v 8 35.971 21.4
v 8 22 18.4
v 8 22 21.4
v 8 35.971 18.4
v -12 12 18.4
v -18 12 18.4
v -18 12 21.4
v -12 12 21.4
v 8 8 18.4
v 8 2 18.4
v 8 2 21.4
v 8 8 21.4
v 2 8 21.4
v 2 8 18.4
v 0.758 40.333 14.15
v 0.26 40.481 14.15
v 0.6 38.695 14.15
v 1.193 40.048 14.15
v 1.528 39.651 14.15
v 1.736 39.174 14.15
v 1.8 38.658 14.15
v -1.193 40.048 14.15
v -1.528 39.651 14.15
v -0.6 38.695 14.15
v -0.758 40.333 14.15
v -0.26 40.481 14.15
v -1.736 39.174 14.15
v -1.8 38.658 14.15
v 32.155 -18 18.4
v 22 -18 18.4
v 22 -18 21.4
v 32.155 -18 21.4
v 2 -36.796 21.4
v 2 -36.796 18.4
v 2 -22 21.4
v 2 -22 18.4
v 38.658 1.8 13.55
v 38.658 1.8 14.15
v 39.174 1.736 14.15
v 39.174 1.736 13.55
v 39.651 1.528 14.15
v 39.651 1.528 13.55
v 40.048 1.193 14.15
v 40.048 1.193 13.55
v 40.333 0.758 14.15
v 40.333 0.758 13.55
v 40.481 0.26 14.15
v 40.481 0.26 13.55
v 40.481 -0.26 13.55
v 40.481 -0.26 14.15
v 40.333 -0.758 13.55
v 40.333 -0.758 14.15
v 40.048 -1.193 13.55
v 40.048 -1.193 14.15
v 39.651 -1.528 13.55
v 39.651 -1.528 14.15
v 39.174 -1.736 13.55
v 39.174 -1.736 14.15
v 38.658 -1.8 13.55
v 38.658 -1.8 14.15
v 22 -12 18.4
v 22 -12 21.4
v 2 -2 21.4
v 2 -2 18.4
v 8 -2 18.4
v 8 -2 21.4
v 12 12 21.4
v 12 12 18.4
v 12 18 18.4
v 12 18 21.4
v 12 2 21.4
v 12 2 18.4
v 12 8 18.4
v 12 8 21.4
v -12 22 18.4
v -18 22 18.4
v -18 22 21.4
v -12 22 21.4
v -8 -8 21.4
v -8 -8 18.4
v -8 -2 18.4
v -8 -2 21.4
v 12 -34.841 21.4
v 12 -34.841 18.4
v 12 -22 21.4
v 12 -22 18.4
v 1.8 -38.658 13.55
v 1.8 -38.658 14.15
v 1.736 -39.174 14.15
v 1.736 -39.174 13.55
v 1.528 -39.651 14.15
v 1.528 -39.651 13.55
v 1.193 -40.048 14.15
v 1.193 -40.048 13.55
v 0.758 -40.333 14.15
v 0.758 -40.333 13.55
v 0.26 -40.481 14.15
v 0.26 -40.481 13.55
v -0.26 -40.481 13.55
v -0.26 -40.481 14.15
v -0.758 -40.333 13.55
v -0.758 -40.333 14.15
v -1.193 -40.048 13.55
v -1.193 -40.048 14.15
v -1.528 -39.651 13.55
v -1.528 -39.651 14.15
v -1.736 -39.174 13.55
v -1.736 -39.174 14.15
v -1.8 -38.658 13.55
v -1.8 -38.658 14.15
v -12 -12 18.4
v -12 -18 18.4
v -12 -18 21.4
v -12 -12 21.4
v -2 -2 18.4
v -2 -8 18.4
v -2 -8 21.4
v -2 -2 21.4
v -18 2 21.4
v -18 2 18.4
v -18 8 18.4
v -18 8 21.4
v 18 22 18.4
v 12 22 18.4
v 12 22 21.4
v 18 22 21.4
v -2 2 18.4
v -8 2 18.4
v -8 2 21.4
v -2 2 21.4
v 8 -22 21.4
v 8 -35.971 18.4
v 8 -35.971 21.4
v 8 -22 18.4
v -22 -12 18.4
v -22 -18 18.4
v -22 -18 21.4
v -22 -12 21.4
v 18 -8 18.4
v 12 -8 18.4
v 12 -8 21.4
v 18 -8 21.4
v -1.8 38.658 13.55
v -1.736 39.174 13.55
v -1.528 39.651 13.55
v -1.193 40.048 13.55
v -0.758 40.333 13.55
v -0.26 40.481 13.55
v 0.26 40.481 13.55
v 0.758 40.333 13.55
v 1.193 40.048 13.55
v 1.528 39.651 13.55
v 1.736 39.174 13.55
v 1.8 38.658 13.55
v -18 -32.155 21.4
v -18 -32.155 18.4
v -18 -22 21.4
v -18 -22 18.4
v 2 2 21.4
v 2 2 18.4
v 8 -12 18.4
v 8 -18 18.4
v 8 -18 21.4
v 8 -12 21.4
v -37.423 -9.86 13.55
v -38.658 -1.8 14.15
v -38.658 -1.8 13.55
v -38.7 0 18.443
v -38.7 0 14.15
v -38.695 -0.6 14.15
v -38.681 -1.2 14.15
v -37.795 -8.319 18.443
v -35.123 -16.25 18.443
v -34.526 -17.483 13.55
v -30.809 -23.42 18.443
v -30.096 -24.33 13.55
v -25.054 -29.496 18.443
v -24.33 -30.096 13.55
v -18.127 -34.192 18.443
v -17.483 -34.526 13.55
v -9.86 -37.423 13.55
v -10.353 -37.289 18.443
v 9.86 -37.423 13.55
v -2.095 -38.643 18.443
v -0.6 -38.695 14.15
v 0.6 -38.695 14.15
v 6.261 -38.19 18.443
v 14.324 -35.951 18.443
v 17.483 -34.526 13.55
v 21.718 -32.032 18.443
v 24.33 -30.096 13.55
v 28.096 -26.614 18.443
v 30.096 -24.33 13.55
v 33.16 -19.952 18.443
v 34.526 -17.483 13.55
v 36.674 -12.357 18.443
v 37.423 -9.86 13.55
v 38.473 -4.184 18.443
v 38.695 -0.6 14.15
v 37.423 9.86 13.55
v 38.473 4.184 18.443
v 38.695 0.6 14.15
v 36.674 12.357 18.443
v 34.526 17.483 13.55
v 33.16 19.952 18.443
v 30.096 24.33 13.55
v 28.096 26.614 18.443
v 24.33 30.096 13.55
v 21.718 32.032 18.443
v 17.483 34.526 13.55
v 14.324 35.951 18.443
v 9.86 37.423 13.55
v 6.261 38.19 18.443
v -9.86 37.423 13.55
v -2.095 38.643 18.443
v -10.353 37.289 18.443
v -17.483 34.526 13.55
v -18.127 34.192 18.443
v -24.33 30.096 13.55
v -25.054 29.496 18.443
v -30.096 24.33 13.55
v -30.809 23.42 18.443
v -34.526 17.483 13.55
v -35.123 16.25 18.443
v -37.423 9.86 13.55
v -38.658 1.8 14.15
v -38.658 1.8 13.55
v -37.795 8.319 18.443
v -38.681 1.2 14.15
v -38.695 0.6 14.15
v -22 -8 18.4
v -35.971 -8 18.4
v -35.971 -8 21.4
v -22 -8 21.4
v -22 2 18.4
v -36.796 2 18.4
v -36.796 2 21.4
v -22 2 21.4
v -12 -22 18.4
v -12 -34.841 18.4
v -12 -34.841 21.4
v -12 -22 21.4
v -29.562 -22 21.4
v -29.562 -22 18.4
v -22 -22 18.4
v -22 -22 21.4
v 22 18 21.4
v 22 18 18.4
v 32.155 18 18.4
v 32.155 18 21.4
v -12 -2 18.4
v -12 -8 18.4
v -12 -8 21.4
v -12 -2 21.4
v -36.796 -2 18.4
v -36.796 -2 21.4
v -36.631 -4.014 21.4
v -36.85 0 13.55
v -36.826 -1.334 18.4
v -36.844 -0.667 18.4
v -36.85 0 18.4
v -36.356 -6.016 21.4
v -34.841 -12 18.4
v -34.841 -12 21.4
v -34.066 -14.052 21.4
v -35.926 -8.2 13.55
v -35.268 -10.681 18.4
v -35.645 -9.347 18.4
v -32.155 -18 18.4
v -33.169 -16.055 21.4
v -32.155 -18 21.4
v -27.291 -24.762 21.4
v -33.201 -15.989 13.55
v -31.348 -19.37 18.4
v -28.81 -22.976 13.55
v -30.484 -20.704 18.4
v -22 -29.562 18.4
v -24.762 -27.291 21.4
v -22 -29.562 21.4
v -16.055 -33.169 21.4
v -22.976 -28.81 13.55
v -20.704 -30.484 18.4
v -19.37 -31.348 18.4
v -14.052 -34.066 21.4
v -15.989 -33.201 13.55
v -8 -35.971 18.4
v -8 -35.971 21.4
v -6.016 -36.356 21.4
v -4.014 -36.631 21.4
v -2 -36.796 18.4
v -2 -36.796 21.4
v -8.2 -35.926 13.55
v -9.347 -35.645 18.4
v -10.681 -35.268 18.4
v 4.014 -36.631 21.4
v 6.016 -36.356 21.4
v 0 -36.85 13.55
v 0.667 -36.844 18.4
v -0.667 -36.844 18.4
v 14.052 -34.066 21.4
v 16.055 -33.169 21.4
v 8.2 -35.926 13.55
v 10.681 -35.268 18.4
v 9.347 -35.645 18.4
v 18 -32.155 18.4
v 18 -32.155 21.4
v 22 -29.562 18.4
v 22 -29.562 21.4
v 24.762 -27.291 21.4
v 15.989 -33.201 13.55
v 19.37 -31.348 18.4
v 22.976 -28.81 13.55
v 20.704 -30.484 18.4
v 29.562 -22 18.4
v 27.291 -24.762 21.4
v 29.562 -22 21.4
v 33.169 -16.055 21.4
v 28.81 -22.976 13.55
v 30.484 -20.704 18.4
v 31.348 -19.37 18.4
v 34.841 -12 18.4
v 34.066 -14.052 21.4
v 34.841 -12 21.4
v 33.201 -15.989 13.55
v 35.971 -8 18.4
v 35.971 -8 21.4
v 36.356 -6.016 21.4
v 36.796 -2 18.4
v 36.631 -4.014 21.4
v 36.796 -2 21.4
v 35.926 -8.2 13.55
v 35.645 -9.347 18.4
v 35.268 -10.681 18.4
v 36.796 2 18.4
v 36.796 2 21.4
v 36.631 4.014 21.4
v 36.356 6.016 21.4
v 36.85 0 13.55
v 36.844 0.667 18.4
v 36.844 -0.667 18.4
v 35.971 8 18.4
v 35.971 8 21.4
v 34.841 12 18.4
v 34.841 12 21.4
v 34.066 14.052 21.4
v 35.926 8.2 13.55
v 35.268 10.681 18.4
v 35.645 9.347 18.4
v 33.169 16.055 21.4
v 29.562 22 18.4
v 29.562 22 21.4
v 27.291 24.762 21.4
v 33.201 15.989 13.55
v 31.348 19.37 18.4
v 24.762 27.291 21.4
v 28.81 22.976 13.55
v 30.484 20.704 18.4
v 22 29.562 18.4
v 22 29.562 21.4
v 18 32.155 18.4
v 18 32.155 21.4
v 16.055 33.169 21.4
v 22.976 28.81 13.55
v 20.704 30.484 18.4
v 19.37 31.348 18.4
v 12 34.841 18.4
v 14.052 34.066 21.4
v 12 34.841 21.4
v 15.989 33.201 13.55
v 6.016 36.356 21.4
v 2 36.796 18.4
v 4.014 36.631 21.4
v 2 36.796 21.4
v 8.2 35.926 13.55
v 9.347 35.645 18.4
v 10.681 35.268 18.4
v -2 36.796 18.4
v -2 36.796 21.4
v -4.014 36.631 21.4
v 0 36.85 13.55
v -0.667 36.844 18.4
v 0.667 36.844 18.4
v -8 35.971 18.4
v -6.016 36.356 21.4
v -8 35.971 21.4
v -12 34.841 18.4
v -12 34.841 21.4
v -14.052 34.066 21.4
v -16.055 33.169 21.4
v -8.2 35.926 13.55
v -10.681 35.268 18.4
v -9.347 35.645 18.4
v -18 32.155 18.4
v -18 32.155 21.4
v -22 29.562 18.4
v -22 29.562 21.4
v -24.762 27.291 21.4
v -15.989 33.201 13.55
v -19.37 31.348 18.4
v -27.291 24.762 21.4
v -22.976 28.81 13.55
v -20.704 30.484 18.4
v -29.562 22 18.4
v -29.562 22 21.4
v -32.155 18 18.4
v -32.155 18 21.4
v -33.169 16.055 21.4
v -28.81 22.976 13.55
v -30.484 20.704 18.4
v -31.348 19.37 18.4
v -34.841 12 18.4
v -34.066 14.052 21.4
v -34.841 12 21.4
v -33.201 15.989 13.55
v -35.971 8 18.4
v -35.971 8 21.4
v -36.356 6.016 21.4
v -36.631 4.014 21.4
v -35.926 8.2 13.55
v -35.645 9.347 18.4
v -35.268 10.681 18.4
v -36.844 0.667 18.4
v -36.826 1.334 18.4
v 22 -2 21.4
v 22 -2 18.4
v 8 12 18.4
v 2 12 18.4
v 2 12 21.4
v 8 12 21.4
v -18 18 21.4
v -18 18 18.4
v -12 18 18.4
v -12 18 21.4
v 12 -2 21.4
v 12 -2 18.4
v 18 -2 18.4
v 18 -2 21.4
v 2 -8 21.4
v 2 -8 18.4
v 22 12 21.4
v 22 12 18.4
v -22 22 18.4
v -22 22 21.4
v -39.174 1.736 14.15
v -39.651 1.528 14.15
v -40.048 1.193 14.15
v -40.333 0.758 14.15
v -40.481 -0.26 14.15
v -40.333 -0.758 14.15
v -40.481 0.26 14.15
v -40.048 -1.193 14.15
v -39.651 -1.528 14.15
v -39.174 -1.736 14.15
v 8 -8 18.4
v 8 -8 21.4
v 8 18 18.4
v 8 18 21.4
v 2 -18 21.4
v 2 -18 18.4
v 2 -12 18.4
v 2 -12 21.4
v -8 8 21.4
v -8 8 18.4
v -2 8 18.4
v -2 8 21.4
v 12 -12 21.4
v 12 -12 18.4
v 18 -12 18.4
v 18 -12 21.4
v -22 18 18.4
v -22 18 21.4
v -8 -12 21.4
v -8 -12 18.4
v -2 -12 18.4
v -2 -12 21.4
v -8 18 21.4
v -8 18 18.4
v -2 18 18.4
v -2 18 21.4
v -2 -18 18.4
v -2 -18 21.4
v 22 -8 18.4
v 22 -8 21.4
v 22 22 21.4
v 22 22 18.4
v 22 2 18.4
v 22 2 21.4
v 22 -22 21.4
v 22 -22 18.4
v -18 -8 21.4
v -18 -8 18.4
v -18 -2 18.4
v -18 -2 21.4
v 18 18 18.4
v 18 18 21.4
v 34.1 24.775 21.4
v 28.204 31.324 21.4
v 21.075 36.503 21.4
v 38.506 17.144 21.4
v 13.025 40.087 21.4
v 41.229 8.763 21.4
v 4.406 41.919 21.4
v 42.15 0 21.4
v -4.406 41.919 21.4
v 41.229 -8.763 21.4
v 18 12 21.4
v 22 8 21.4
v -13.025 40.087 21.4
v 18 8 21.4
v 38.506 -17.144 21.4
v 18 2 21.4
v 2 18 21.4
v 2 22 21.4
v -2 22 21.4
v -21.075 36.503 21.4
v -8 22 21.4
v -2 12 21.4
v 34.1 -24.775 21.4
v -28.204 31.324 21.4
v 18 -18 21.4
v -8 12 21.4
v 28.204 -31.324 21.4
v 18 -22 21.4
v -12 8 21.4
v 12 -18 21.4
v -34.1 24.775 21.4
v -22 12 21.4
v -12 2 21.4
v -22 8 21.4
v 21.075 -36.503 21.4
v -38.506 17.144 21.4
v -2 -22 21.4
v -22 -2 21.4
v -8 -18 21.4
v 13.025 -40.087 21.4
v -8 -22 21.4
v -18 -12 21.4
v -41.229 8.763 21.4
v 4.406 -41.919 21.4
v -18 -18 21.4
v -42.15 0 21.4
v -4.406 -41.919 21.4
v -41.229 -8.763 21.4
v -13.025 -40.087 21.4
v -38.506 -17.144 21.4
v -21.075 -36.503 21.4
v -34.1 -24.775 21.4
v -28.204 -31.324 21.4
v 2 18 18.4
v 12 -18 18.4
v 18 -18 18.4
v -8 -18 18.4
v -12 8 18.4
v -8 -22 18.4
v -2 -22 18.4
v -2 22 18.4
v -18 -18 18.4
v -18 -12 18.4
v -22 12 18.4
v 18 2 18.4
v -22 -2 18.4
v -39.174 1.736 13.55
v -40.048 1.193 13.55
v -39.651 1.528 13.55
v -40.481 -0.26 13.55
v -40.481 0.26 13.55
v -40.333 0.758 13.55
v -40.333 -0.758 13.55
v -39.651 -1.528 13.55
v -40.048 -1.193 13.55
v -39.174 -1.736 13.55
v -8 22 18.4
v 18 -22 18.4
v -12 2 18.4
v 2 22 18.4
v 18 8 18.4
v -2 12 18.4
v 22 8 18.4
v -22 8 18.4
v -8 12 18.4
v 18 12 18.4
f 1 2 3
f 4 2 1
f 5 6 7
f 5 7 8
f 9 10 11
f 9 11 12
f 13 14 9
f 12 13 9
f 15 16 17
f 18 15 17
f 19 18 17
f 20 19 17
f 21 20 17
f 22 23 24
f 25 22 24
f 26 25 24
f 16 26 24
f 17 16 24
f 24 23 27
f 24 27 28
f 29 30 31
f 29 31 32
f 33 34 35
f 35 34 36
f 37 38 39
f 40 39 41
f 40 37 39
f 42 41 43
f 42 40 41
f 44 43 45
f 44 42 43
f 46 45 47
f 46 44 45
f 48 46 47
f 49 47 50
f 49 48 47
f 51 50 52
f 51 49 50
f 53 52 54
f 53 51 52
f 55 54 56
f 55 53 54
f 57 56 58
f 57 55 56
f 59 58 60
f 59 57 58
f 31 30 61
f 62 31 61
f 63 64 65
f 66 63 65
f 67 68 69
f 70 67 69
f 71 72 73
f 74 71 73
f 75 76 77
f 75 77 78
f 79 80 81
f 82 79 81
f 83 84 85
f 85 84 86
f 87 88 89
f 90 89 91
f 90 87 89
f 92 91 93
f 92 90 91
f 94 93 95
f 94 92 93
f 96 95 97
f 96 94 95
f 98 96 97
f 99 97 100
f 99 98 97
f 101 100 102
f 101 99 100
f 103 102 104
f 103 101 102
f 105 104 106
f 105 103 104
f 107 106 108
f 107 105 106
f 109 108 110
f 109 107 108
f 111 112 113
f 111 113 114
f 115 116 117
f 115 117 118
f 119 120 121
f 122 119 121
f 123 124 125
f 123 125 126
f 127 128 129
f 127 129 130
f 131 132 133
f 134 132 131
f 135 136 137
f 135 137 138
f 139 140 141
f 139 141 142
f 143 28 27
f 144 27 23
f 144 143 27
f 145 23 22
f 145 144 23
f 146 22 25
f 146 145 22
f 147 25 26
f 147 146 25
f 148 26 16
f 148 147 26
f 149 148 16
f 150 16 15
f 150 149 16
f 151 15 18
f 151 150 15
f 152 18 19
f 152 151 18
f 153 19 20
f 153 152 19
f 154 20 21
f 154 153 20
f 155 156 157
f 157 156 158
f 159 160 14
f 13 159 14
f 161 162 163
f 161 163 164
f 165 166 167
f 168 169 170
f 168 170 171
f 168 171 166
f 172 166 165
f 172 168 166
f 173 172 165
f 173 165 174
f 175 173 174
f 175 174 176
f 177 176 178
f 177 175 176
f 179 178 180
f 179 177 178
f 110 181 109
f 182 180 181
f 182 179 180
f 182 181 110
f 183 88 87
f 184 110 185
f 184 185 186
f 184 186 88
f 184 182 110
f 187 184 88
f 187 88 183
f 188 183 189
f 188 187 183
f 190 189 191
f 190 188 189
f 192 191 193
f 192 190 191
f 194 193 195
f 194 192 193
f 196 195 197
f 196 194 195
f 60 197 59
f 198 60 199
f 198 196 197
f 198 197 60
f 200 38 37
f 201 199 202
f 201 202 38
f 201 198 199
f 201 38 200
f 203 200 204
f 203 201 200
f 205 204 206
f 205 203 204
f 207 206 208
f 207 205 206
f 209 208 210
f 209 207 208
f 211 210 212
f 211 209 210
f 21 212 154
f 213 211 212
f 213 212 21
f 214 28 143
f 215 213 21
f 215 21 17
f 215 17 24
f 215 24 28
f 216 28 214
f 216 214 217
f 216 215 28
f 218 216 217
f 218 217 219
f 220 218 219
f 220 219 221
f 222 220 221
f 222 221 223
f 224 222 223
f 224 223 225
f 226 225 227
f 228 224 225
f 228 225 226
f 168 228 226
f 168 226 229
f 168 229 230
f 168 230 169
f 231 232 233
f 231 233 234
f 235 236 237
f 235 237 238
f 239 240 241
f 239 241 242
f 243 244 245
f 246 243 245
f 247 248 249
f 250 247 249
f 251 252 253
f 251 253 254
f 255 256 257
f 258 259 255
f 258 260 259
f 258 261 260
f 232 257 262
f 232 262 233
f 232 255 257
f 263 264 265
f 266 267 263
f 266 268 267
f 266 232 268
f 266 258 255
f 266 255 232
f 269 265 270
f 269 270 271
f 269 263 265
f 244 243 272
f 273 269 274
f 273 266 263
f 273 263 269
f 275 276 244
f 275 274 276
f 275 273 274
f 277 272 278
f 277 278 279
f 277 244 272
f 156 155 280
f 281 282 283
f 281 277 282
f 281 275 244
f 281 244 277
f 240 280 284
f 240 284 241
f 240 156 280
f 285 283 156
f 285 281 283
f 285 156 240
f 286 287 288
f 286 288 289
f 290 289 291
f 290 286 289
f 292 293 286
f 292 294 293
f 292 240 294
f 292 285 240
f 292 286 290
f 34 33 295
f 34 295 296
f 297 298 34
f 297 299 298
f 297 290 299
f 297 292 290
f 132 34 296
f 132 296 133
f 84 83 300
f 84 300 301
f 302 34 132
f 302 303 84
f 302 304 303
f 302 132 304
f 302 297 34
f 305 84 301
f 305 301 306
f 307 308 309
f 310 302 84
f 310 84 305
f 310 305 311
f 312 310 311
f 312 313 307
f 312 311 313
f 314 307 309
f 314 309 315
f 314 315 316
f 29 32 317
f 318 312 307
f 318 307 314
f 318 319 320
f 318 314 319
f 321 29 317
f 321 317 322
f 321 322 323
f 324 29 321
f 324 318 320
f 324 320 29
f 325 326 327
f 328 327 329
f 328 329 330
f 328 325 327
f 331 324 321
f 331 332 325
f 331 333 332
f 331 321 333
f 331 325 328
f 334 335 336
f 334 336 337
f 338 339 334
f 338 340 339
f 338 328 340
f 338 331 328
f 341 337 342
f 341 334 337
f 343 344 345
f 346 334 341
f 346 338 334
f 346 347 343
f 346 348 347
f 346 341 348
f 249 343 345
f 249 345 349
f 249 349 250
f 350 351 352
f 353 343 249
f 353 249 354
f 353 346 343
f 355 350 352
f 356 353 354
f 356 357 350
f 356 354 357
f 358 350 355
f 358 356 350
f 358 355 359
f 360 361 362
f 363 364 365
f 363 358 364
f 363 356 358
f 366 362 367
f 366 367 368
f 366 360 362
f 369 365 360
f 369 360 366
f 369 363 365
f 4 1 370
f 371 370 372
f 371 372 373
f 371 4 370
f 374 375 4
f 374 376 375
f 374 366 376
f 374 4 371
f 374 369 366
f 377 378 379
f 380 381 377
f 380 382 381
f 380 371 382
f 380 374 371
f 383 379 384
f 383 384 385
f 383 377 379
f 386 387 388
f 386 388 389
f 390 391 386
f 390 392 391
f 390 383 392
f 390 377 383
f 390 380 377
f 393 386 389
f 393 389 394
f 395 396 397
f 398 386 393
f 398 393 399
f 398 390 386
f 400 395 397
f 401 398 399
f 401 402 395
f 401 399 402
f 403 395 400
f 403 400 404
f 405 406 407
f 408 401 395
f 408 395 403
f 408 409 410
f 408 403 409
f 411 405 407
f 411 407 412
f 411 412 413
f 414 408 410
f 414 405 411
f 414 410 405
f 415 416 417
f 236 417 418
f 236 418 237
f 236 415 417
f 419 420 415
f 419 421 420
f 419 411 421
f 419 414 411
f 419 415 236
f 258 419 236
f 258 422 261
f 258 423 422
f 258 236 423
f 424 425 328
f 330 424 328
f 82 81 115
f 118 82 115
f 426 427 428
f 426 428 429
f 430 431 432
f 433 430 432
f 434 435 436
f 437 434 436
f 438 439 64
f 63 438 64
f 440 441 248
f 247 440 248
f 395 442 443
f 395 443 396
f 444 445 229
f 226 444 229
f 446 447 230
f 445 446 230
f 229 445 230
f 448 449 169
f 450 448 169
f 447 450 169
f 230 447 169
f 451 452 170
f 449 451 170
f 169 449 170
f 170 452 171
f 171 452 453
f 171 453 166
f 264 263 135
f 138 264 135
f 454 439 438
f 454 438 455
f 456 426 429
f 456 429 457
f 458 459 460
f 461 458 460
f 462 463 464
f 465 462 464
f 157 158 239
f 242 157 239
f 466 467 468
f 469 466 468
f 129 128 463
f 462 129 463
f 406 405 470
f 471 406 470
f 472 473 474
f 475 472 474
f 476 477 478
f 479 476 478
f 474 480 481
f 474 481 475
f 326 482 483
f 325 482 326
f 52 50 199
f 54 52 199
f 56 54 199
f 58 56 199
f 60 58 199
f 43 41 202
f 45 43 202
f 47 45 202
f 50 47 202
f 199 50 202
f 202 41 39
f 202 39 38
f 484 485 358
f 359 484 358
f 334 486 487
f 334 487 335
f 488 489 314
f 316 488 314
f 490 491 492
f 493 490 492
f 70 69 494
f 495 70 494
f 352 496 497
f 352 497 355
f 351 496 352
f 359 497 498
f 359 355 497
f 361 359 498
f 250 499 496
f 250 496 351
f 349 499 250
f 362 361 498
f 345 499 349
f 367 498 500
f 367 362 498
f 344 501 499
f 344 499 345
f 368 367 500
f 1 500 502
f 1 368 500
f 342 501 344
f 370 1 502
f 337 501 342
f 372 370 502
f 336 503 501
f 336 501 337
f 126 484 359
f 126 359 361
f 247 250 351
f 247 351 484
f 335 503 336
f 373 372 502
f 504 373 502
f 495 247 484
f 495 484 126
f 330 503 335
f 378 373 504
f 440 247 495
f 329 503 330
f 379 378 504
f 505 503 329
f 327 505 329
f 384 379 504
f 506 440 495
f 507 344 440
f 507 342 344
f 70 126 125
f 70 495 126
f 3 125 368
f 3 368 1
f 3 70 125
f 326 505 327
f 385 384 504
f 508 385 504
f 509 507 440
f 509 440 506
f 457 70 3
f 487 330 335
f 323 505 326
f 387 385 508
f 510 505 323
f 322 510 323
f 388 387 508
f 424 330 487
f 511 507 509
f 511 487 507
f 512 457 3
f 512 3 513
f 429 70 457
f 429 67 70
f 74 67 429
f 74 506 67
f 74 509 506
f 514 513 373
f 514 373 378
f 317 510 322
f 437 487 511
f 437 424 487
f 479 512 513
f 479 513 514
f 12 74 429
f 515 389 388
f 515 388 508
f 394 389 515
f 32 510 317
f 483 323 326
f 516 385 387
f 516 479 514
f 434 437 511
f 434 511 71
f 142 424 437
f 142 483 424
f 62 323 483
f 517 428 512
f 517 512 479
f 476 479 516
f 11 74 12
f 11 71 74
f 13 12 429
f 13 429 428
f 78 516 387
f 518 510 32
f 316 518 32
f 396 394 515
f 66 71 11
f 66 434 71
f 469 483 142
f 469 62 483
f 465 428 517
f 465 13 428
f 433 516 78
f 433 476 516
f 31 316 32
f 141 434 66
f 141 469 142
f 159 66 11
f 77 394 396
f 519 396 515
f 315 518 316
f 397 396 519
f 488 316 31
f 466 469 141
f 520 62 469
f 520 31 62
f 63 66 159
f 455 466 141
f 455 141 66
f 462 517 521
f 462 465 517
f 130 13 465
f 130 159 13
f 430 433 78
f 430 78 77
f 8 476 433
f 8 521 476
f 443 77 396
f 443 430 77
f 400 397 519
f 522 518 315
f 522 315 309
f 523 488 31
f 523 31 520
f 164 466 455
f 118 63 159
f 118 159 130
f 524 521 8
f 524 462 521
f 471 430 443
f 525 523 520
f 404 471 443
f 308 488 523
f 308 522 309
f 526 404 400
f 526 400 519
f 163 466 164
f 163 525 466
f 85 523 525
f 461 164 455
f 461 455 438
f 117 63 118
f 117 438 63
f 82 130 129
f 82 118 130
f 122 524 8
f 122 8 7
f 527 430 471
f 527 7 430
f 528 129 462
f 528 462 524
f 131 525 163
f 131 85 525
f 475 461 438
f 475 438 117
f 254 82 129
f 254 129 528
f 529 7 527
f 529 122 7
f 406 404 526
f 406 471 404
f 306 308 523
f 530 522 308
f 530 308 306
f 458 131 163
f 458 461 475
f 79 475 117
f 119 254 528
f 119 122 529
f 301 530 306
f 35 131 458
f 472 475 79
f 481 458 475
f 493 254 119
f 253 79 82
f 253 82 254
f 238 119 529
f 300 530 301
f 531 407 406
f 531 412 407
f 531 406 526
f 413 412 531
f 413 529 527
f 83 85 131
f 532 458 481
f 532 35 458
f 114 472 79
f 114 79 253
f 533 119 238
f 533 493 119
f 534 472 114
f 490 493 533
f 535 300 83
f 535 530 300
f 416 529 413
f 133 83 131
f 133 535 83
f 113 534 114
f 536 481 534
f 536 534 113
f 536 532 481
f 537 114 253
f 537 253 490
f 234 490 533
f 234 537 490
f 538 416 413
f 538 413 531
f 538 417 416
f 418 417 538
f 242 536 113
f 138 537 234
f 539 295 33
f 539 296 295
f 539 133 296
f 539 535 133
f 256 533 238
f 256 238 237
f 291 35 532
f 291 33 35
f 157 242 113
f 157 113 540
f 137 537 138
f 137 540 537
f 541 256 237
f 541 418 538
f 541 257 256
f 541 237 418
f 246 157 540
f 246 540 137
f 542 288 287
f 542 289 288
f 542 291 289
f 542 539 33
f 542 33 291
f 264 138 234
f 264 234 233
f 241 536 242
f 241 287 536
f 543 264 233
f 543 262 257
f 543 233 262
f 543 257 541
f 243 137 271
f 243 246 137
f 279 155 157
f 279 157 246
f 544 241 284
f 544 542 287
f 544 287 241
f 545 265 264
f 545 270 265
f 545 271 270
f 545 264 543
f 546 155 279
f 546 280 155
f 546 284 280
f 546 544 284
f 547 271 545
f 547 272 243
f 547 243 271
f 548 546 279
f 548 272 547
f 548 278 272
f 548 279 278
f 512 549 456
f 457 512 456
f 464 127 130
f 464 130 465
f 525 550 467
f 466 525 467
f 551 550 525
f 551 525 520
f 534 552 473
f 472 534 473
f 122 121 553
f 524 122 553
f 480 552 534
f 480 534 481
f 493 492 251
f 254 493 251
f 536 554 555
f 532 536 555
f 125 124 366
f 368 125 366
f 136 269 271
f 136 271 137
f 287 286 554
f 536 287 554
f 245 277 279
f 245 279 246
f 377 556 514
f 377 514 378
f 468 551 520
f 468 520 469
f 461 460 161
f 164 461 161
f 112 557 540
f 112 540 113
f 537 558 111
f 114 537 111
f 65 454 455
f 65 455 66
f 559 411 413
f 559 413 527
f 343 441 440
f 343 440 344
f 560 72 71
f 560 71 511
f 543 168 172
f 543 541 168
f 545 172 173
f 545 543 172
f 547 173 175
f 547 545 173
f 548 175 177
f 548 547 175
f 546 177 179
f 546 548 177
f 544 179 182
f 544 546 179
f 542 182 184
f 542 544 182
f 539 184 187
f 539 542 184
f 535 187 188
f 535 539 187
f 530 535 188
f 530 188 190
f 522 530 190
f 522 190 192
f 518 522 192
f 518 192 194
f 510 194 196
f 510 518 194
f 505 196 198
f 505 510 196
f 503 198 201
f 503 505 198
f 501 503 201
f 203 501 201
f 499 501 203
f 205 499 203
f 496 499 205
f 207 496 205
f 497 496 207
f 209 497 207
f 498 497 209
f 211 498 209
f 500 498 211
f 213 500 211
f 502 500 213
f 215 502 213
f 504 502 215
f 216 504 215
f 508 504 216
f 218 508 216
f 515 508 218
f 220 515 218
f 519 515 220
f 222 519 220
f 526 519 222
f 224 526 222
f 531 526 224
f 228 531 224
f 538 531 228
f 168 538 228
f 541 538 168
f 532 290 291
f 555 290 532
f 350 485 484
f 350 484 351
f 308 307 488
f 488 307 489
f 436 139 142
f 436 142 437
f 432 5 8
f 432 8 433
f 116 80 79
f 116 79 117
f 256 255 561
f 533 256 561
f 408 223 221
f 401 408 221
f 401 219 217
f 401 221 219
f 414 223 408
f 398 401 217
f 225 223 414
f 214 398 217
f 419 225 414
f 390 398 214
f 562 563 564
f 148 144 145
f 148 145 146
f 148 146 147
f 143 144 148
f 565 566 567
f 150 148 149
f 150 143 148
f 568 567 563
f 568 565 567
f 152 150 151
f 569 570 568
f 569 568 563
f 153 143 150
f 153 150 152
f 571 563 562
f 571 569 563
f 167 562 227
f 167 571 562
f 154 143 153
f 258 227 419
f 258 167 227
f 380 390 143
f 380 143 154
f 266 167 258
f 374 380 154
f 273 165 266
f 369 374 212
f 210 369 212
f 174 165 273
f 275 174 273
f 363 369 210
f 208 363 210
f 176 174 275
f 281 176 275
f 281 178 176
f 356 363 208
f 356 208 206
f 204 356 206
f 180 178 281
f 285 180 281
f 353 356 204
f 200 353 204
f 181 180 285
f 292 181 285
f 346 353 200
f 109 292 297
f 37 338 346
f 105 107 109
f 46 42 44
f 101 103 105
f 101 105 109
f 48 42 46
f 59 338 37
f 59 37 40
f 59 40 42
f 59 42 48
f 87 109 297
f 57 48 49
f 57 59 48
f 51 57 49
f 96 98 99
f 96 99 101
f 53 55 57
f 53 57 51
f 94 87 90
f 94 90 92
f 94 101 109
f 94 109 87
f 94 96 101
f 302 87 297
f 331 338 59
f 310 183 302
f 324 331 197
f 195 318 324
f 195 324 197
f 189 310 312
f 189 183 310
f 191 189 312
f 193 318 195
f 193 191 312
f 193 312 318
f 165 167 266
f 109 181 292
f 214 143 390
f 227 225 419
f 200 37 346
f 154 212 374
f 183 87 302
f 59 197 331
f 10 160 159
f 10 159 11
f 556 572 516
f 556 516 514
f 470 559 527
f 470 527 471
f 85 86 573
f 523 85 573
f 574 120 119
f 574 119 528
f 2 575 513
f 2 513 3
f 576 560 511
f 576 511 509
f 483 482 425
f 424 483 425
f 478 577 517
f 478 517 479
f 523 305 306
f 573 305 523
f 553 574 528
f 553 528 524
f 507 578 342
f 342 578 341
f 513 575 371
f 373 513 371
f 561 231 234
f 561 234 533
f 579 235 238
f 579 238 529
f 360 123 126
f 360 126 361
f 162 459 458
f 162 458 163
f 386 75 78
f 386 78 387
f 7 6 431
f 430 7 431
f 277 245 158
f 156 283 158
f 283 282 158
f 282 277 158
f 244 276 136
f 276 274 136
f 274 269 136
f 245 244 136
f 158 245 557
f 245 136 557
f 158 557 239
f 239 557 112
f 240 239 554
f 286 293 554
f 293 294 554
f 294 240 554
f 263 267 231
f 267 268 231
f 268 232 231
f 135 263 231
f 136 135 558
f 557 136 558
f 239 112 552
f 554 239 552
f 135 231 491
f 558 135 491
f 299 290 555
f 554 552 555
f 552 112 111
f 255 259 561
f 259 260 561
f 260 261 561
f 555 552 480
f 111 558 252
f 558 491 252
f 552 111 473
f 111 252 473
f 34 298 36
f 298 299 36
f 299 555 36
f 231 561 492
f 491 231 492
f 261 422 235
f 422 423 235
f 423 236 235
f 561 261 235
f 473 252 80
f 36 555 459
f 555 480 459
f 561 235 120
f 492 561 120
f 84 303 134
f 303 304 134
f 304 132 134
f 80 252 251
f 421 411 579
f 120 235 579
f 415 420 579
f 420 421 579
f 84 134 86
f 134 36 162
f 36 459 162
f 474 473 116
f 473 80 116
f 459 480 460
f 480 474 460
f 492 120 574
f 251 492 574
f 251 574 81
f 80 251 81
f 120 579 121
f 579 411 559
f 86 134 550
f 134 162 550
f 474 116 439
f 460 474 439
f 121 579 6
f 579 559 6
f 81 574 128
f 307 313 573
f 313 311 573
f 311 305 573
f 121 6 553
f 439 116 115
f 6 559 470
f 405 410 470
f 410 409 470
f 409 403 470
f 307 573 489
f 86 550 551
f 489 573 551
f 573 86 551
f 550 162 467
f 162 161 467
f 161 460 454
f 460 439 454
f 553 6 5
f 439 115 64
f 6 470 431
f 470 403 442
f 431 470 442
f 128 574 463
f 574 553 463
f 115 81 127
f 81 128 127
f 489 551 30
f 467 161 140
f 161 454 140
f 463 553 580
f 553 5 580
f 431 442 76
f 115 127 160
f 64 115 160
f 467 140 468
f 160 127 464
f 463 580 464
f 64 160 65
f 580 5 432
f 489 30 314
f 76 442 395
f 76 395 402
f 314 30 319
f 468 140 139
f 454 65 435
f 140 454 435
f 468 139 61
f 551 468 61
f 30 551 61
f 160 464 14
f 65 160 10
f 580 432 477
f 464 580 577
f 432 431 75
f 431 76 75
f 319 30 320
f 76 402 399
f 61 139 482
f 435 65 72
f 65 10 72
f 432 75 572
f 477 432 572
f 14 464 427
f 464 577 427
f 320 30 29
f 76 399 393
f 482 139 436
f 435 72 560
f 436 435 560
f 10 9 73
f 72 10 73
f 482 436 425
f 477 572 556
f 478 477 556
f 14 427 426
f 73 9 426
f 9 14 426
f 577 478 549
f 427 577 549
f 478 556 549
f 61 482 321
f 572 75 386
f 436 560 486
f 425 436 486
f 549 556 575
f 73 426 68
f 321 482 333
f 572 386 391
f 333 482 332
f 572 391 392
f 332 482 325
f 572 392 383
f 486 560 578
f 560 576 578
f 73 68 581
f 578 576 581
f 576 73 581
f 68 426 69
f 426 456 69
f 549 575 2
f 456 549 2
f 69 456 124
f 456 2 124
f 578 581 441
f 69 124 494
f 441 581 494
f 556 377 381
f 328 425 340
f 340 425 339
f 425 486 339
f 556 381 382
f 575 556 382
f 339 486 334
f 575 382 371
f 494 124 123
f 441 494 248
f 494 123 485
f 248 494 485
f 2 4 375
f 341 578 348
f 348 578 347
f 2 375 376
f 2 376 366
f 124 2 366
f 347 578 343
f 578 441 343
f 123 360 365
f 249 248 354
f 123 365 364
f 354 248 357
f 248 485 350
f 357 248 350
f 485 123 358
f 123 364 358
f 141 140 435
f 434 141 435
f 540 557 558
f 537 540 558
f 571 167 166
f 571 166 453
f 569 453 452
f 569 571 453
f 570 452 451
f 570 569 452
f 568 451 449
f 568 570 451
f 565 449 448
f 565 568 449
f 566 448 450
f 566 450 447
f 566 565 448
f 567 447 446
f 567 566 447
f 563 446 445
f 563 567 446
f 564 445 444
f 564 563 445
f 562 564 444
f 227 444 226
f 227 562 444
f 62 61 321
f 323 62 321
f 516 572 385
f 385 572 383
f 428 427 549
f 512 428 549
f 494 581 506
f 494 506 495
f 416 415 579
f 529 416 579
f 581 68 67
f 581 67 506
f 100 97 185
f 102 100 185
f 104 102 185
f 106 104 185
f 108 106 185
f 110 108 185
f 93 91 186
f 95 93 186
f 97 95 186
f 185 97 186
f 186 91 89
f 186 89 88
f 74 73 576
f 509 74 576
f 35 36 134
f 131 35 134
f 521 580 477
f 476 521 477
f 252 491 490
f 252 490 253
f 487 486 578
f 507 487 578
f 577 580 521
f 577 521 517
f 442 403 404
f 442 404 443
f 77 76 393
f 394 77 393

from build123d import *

# Parameters (mm, degrees)
CYLINDER063_R         = 50
CYLINDER063_DEPTH     = 10
CYLINDER067_R         = 37.5
CYLINDER067_DEPTH     = 5
CYLINDER059_R         = 45
CYLINDER059_DEPTH     = 5
BOX024_W              = 66
BOX024_H              = 4
BOX024_DEPTH          = 5
BOX028_W              = 66
BOX028_H              = 4
BOX028_DEPTH          = 5
BOX022_W              = 74
BOX022_H              = 4
BOX022_DEPTH          = 5
BOX020_W              = 74
BOX020_H              = 4
BOX020_DEPTH          = 5
BOX025_W              = 74
BOX025_H              = 4
BOX025_DEPTH          = 5
BOX027_W              = 66
BOX027_H              = 4
BOX027_DEPTH          = 5
BOX026_W              = 76
BOX026_H              = 4
BOX026_DEPTH          = 5
BOX021_W              = 66
BOX021_H              = 4
BOX021_DEPTH          = 5
BOX029_W              = 76
BOX029_H              = 4
BOX029_DEPTH          = 5
BOX023_W              = 74
BOX023_H              = 4
BOX023_DEPTH          = 5
CYLINDER065_R         = 37.3
CYLINDER065_DEPTH     = 5
CYLINDER060_R         = 37.5
CYLINDER060_DEPTH     = 5
SKETCH005_R           = 1.8
PAD001_DEPTH          = 0.6
POLARPATTERN003_COUNT = 4


with BuildPart() as cylinder063:
    # Cylinder063 → Cylinder063 (new body)
    with BuildSketch(Plane.XY.offset(-49)):
        Circle(CYLINDER063_R)
    extrude(amount=CYLINDER063_DEPTH)


with BuildPart() as cylinder067:
    # Cylinder067 → Cylinder067 (new body)
    with BuildSketch(Plane.XY.offset(-41)):
        Circle(CYLINDER067_R)
    extrude(amount=CYLINDER067_DEPTH)


with BuildPart() as cut032:
    # Cylinder059 → Cylinder059 (new body)
    with BuildSketch(Plane.XY.offset(-41)):
        Circle(CYLINDER059_R)
    extrude(amount=CYLINDER059_DEPTH)

    # Cut032: cut Cylinder067
    add(cylinder067.part, mode=Mode.SUBTRACT)


with BuildPart() as cube024:
    # Box024 → Box024 (new body)
    with BuildSketch(Plane(origin=(-18, -33, -41), x_dir=(0, 1, 0), z_dir=(0, 0, 1))):
        with Locations((33, 2)):
            Rectangle(BOX024_W, BOX024_H)
    extrude(amount=BOX024_DEPTH)


with BuildPart() as cube028:
    # Box028 → Box028 (new body)
    with BuildSketch(Plane(origin=(22, -33, -41), x_dir=(0, 1, 0), z_dir=(0, 0, 1))):
        with Locations((33, 2)):
            Rectangle(BOX028_W, BOX028_H)
    extrude(amount=BOX028_DEPTH)


with BuildPart() as cube022:
    # Box022 → Box022 (new body)
    with BuildSketch(Plane(origin=(-8, -37, -41), x_dir=(0, 1, 0), z_dir=(0, 0, 1))):
        with Locations((37, 2)):
            Rectangle(BOX022_W, BOX022_H)
    extrude(amount=BOX022_DEPTH)


with BuildPart() as cube020:
    # Box020 → Box020 (new body)
    with BuildSketch(Plane(origin=(-37, 8, -41), x_dir=(1, 0, 0), z_dir=(0, 0, 1))):
        with Locations((37, 2)):
            Rectangle(BOX020_W, BOX020_H)
    extrude(amount=BOX020_DEPTH)


with BuildPart() as cube025:
    # Box025 → Box025 (new body)
    with BuildSketch(Plane(origin=(-37, -12, -41), x_dir=(1, 0, 0), z_dir=(0, 0, 1))):
        with Locations((37, 2)):
            Rectangle(BOX025_W, BOX025_H)
    extrude(amount=BOX025_DEPTH)


with BuildPart() as cube027:
    # Box027 → Box027 (new body)
    with BuildSketch(Plane(origin=(-33, -22, -41), x_dir=(1, 0, 0), z_dir=(0, 0, 1))):
        with Locations((33, 2)):
            Rectangle(BOX027_W, BOX027_H)
    extrude(amount=BOX027_DEPTH)


with BuildPart() as cube026:
    # Box026 → Box026 (new body)
    with BuildSketch(Plane(origin=(-38, -2, -41), x_dir=(1, 0, 0), z_dir=(0, 0, 1))):
        with Locations((38, 2)):
            Rectangle(BOX026_W, BOX026_H)
    extrude(amount=BOX026_DEPTH)


with BuildPart() as cube021:
    # Box021 → Box021 (new body)
    with BuildSketch(Plane(origin=(-33, 18, -41), x_dir=(1, 0, 0), z_dir=(0, 0, 1))):
        with Locations((33, 2)):
            Rectangle(BOX021_W, BOX021_H)
    extrude(amount=BOX021_DEPTH)


with BuildPart() as cube029:
    # Box029 → Box029 (new body)
    with BuildSketch(Plane(origin=(2, -38, -41), x_dir=(0, 1, 0), z_dir=(0, 0, 1))):
        with Locations((38, 2)):
            Rectangle(BOX029_W, BOX029_H)
    extrude(amount=BOX029_DEPTH)


with BuildPart() as cube023:
    # Box023 → Box023 (new body)
    with BuildSketch(Plane(origin=(12, -37, -41), x_dir=(0, 1, 0), z_dir=(0, 0, 1))):
        with Locations((37, 2)):
            Rectangle(BOX023_W, BOX023_H)
    extrude(amount=BOX023_DEPTH)


with BuildPart() as cylinder065:
    # Cylinder065 → Cylinder065 (new body)
    with BuildSketch(Plane.XY.offset(-41)):
        Circle(CYLINDER065_R)
    extrude(amount=CYLINDER065_DEPTH)


with BuildPart() as panal_version1:
    # Cylinder060 → Cylinder060 (new body)
    with BuildSketch(Plane.XY.offset(-41)):
        Circle(CYLINDER060_R)
    extrude(amount=CYLINDER060_DEPTH)

    # Cut035: cut Cylinder065
    add(cylinder065.part, mode=Mode.SUBTRACT)

    # Fusion022: union Cube024, Cube028, Cube022, Cube020, Cube025, Cube027, Cube026, Cube021, Cube029, Cube023
    add(cube024.part)
    add(cube028.part)
    add(cube022.part)
    add(cube020.part)
    add(cube025.part)
    add(cube027.part)
    add(cube026.part)
    add(cube021.part)
    add(cube029.part)
    add(cube023.part)

    # Cut036: cut Cut032
    add(cut032.part, mode=Mode.SUBTRACT)

    # Cut034: cut Cylinder063
    add(cylinder063.part, mode=Mode.SUBTRACT)


with BuildPart() as panal_version1_1:
    # Cut034 placement: moved
    add(panal_version1.part.moved(Location((0, 0, 57.4))))


with BuildPart() as interno1:
    # Sketch006 → Revolution002 (revolve)
    with BuildSketch(Plane.XZ):
        Polygon((-36.85, 13.55), (-38.7, 13.55), (-38.7, 18.442992), (-42.15, 21.4), (-36.85, 21.4), align=None)
    revolve(axis=Axis((0, 0, 0), (0, 0, 1)))

    # Sketch005 (on Face1 of Revolution002) → Pad001 (new body)
    with BuildSketch(Plane(origin=(0, 0, 13.55), x_dir=(1, 0, 0), z_dir=(0, 0, -1))):
        with Locations((-38.7, 0)):
            Circle(SKETCH005_R)
    pad001 = extrude(amount=-PAD001_DEPTH)

    # PolarPattern003: Pad001 ×4 about axis
    polarpattern003_axis = Axis((0, 0, 13.55), (0, 0, -1))
    for i in range(1, POLARPATTERN003_COUNT):
        add(pad001.rotate(polarpattern003_axis, i * 360 / POLARPATTERN003_COUNT))

    # Fusion036: union panal_version1
    add(panal_version1_1.part)


solid = interno1.part
